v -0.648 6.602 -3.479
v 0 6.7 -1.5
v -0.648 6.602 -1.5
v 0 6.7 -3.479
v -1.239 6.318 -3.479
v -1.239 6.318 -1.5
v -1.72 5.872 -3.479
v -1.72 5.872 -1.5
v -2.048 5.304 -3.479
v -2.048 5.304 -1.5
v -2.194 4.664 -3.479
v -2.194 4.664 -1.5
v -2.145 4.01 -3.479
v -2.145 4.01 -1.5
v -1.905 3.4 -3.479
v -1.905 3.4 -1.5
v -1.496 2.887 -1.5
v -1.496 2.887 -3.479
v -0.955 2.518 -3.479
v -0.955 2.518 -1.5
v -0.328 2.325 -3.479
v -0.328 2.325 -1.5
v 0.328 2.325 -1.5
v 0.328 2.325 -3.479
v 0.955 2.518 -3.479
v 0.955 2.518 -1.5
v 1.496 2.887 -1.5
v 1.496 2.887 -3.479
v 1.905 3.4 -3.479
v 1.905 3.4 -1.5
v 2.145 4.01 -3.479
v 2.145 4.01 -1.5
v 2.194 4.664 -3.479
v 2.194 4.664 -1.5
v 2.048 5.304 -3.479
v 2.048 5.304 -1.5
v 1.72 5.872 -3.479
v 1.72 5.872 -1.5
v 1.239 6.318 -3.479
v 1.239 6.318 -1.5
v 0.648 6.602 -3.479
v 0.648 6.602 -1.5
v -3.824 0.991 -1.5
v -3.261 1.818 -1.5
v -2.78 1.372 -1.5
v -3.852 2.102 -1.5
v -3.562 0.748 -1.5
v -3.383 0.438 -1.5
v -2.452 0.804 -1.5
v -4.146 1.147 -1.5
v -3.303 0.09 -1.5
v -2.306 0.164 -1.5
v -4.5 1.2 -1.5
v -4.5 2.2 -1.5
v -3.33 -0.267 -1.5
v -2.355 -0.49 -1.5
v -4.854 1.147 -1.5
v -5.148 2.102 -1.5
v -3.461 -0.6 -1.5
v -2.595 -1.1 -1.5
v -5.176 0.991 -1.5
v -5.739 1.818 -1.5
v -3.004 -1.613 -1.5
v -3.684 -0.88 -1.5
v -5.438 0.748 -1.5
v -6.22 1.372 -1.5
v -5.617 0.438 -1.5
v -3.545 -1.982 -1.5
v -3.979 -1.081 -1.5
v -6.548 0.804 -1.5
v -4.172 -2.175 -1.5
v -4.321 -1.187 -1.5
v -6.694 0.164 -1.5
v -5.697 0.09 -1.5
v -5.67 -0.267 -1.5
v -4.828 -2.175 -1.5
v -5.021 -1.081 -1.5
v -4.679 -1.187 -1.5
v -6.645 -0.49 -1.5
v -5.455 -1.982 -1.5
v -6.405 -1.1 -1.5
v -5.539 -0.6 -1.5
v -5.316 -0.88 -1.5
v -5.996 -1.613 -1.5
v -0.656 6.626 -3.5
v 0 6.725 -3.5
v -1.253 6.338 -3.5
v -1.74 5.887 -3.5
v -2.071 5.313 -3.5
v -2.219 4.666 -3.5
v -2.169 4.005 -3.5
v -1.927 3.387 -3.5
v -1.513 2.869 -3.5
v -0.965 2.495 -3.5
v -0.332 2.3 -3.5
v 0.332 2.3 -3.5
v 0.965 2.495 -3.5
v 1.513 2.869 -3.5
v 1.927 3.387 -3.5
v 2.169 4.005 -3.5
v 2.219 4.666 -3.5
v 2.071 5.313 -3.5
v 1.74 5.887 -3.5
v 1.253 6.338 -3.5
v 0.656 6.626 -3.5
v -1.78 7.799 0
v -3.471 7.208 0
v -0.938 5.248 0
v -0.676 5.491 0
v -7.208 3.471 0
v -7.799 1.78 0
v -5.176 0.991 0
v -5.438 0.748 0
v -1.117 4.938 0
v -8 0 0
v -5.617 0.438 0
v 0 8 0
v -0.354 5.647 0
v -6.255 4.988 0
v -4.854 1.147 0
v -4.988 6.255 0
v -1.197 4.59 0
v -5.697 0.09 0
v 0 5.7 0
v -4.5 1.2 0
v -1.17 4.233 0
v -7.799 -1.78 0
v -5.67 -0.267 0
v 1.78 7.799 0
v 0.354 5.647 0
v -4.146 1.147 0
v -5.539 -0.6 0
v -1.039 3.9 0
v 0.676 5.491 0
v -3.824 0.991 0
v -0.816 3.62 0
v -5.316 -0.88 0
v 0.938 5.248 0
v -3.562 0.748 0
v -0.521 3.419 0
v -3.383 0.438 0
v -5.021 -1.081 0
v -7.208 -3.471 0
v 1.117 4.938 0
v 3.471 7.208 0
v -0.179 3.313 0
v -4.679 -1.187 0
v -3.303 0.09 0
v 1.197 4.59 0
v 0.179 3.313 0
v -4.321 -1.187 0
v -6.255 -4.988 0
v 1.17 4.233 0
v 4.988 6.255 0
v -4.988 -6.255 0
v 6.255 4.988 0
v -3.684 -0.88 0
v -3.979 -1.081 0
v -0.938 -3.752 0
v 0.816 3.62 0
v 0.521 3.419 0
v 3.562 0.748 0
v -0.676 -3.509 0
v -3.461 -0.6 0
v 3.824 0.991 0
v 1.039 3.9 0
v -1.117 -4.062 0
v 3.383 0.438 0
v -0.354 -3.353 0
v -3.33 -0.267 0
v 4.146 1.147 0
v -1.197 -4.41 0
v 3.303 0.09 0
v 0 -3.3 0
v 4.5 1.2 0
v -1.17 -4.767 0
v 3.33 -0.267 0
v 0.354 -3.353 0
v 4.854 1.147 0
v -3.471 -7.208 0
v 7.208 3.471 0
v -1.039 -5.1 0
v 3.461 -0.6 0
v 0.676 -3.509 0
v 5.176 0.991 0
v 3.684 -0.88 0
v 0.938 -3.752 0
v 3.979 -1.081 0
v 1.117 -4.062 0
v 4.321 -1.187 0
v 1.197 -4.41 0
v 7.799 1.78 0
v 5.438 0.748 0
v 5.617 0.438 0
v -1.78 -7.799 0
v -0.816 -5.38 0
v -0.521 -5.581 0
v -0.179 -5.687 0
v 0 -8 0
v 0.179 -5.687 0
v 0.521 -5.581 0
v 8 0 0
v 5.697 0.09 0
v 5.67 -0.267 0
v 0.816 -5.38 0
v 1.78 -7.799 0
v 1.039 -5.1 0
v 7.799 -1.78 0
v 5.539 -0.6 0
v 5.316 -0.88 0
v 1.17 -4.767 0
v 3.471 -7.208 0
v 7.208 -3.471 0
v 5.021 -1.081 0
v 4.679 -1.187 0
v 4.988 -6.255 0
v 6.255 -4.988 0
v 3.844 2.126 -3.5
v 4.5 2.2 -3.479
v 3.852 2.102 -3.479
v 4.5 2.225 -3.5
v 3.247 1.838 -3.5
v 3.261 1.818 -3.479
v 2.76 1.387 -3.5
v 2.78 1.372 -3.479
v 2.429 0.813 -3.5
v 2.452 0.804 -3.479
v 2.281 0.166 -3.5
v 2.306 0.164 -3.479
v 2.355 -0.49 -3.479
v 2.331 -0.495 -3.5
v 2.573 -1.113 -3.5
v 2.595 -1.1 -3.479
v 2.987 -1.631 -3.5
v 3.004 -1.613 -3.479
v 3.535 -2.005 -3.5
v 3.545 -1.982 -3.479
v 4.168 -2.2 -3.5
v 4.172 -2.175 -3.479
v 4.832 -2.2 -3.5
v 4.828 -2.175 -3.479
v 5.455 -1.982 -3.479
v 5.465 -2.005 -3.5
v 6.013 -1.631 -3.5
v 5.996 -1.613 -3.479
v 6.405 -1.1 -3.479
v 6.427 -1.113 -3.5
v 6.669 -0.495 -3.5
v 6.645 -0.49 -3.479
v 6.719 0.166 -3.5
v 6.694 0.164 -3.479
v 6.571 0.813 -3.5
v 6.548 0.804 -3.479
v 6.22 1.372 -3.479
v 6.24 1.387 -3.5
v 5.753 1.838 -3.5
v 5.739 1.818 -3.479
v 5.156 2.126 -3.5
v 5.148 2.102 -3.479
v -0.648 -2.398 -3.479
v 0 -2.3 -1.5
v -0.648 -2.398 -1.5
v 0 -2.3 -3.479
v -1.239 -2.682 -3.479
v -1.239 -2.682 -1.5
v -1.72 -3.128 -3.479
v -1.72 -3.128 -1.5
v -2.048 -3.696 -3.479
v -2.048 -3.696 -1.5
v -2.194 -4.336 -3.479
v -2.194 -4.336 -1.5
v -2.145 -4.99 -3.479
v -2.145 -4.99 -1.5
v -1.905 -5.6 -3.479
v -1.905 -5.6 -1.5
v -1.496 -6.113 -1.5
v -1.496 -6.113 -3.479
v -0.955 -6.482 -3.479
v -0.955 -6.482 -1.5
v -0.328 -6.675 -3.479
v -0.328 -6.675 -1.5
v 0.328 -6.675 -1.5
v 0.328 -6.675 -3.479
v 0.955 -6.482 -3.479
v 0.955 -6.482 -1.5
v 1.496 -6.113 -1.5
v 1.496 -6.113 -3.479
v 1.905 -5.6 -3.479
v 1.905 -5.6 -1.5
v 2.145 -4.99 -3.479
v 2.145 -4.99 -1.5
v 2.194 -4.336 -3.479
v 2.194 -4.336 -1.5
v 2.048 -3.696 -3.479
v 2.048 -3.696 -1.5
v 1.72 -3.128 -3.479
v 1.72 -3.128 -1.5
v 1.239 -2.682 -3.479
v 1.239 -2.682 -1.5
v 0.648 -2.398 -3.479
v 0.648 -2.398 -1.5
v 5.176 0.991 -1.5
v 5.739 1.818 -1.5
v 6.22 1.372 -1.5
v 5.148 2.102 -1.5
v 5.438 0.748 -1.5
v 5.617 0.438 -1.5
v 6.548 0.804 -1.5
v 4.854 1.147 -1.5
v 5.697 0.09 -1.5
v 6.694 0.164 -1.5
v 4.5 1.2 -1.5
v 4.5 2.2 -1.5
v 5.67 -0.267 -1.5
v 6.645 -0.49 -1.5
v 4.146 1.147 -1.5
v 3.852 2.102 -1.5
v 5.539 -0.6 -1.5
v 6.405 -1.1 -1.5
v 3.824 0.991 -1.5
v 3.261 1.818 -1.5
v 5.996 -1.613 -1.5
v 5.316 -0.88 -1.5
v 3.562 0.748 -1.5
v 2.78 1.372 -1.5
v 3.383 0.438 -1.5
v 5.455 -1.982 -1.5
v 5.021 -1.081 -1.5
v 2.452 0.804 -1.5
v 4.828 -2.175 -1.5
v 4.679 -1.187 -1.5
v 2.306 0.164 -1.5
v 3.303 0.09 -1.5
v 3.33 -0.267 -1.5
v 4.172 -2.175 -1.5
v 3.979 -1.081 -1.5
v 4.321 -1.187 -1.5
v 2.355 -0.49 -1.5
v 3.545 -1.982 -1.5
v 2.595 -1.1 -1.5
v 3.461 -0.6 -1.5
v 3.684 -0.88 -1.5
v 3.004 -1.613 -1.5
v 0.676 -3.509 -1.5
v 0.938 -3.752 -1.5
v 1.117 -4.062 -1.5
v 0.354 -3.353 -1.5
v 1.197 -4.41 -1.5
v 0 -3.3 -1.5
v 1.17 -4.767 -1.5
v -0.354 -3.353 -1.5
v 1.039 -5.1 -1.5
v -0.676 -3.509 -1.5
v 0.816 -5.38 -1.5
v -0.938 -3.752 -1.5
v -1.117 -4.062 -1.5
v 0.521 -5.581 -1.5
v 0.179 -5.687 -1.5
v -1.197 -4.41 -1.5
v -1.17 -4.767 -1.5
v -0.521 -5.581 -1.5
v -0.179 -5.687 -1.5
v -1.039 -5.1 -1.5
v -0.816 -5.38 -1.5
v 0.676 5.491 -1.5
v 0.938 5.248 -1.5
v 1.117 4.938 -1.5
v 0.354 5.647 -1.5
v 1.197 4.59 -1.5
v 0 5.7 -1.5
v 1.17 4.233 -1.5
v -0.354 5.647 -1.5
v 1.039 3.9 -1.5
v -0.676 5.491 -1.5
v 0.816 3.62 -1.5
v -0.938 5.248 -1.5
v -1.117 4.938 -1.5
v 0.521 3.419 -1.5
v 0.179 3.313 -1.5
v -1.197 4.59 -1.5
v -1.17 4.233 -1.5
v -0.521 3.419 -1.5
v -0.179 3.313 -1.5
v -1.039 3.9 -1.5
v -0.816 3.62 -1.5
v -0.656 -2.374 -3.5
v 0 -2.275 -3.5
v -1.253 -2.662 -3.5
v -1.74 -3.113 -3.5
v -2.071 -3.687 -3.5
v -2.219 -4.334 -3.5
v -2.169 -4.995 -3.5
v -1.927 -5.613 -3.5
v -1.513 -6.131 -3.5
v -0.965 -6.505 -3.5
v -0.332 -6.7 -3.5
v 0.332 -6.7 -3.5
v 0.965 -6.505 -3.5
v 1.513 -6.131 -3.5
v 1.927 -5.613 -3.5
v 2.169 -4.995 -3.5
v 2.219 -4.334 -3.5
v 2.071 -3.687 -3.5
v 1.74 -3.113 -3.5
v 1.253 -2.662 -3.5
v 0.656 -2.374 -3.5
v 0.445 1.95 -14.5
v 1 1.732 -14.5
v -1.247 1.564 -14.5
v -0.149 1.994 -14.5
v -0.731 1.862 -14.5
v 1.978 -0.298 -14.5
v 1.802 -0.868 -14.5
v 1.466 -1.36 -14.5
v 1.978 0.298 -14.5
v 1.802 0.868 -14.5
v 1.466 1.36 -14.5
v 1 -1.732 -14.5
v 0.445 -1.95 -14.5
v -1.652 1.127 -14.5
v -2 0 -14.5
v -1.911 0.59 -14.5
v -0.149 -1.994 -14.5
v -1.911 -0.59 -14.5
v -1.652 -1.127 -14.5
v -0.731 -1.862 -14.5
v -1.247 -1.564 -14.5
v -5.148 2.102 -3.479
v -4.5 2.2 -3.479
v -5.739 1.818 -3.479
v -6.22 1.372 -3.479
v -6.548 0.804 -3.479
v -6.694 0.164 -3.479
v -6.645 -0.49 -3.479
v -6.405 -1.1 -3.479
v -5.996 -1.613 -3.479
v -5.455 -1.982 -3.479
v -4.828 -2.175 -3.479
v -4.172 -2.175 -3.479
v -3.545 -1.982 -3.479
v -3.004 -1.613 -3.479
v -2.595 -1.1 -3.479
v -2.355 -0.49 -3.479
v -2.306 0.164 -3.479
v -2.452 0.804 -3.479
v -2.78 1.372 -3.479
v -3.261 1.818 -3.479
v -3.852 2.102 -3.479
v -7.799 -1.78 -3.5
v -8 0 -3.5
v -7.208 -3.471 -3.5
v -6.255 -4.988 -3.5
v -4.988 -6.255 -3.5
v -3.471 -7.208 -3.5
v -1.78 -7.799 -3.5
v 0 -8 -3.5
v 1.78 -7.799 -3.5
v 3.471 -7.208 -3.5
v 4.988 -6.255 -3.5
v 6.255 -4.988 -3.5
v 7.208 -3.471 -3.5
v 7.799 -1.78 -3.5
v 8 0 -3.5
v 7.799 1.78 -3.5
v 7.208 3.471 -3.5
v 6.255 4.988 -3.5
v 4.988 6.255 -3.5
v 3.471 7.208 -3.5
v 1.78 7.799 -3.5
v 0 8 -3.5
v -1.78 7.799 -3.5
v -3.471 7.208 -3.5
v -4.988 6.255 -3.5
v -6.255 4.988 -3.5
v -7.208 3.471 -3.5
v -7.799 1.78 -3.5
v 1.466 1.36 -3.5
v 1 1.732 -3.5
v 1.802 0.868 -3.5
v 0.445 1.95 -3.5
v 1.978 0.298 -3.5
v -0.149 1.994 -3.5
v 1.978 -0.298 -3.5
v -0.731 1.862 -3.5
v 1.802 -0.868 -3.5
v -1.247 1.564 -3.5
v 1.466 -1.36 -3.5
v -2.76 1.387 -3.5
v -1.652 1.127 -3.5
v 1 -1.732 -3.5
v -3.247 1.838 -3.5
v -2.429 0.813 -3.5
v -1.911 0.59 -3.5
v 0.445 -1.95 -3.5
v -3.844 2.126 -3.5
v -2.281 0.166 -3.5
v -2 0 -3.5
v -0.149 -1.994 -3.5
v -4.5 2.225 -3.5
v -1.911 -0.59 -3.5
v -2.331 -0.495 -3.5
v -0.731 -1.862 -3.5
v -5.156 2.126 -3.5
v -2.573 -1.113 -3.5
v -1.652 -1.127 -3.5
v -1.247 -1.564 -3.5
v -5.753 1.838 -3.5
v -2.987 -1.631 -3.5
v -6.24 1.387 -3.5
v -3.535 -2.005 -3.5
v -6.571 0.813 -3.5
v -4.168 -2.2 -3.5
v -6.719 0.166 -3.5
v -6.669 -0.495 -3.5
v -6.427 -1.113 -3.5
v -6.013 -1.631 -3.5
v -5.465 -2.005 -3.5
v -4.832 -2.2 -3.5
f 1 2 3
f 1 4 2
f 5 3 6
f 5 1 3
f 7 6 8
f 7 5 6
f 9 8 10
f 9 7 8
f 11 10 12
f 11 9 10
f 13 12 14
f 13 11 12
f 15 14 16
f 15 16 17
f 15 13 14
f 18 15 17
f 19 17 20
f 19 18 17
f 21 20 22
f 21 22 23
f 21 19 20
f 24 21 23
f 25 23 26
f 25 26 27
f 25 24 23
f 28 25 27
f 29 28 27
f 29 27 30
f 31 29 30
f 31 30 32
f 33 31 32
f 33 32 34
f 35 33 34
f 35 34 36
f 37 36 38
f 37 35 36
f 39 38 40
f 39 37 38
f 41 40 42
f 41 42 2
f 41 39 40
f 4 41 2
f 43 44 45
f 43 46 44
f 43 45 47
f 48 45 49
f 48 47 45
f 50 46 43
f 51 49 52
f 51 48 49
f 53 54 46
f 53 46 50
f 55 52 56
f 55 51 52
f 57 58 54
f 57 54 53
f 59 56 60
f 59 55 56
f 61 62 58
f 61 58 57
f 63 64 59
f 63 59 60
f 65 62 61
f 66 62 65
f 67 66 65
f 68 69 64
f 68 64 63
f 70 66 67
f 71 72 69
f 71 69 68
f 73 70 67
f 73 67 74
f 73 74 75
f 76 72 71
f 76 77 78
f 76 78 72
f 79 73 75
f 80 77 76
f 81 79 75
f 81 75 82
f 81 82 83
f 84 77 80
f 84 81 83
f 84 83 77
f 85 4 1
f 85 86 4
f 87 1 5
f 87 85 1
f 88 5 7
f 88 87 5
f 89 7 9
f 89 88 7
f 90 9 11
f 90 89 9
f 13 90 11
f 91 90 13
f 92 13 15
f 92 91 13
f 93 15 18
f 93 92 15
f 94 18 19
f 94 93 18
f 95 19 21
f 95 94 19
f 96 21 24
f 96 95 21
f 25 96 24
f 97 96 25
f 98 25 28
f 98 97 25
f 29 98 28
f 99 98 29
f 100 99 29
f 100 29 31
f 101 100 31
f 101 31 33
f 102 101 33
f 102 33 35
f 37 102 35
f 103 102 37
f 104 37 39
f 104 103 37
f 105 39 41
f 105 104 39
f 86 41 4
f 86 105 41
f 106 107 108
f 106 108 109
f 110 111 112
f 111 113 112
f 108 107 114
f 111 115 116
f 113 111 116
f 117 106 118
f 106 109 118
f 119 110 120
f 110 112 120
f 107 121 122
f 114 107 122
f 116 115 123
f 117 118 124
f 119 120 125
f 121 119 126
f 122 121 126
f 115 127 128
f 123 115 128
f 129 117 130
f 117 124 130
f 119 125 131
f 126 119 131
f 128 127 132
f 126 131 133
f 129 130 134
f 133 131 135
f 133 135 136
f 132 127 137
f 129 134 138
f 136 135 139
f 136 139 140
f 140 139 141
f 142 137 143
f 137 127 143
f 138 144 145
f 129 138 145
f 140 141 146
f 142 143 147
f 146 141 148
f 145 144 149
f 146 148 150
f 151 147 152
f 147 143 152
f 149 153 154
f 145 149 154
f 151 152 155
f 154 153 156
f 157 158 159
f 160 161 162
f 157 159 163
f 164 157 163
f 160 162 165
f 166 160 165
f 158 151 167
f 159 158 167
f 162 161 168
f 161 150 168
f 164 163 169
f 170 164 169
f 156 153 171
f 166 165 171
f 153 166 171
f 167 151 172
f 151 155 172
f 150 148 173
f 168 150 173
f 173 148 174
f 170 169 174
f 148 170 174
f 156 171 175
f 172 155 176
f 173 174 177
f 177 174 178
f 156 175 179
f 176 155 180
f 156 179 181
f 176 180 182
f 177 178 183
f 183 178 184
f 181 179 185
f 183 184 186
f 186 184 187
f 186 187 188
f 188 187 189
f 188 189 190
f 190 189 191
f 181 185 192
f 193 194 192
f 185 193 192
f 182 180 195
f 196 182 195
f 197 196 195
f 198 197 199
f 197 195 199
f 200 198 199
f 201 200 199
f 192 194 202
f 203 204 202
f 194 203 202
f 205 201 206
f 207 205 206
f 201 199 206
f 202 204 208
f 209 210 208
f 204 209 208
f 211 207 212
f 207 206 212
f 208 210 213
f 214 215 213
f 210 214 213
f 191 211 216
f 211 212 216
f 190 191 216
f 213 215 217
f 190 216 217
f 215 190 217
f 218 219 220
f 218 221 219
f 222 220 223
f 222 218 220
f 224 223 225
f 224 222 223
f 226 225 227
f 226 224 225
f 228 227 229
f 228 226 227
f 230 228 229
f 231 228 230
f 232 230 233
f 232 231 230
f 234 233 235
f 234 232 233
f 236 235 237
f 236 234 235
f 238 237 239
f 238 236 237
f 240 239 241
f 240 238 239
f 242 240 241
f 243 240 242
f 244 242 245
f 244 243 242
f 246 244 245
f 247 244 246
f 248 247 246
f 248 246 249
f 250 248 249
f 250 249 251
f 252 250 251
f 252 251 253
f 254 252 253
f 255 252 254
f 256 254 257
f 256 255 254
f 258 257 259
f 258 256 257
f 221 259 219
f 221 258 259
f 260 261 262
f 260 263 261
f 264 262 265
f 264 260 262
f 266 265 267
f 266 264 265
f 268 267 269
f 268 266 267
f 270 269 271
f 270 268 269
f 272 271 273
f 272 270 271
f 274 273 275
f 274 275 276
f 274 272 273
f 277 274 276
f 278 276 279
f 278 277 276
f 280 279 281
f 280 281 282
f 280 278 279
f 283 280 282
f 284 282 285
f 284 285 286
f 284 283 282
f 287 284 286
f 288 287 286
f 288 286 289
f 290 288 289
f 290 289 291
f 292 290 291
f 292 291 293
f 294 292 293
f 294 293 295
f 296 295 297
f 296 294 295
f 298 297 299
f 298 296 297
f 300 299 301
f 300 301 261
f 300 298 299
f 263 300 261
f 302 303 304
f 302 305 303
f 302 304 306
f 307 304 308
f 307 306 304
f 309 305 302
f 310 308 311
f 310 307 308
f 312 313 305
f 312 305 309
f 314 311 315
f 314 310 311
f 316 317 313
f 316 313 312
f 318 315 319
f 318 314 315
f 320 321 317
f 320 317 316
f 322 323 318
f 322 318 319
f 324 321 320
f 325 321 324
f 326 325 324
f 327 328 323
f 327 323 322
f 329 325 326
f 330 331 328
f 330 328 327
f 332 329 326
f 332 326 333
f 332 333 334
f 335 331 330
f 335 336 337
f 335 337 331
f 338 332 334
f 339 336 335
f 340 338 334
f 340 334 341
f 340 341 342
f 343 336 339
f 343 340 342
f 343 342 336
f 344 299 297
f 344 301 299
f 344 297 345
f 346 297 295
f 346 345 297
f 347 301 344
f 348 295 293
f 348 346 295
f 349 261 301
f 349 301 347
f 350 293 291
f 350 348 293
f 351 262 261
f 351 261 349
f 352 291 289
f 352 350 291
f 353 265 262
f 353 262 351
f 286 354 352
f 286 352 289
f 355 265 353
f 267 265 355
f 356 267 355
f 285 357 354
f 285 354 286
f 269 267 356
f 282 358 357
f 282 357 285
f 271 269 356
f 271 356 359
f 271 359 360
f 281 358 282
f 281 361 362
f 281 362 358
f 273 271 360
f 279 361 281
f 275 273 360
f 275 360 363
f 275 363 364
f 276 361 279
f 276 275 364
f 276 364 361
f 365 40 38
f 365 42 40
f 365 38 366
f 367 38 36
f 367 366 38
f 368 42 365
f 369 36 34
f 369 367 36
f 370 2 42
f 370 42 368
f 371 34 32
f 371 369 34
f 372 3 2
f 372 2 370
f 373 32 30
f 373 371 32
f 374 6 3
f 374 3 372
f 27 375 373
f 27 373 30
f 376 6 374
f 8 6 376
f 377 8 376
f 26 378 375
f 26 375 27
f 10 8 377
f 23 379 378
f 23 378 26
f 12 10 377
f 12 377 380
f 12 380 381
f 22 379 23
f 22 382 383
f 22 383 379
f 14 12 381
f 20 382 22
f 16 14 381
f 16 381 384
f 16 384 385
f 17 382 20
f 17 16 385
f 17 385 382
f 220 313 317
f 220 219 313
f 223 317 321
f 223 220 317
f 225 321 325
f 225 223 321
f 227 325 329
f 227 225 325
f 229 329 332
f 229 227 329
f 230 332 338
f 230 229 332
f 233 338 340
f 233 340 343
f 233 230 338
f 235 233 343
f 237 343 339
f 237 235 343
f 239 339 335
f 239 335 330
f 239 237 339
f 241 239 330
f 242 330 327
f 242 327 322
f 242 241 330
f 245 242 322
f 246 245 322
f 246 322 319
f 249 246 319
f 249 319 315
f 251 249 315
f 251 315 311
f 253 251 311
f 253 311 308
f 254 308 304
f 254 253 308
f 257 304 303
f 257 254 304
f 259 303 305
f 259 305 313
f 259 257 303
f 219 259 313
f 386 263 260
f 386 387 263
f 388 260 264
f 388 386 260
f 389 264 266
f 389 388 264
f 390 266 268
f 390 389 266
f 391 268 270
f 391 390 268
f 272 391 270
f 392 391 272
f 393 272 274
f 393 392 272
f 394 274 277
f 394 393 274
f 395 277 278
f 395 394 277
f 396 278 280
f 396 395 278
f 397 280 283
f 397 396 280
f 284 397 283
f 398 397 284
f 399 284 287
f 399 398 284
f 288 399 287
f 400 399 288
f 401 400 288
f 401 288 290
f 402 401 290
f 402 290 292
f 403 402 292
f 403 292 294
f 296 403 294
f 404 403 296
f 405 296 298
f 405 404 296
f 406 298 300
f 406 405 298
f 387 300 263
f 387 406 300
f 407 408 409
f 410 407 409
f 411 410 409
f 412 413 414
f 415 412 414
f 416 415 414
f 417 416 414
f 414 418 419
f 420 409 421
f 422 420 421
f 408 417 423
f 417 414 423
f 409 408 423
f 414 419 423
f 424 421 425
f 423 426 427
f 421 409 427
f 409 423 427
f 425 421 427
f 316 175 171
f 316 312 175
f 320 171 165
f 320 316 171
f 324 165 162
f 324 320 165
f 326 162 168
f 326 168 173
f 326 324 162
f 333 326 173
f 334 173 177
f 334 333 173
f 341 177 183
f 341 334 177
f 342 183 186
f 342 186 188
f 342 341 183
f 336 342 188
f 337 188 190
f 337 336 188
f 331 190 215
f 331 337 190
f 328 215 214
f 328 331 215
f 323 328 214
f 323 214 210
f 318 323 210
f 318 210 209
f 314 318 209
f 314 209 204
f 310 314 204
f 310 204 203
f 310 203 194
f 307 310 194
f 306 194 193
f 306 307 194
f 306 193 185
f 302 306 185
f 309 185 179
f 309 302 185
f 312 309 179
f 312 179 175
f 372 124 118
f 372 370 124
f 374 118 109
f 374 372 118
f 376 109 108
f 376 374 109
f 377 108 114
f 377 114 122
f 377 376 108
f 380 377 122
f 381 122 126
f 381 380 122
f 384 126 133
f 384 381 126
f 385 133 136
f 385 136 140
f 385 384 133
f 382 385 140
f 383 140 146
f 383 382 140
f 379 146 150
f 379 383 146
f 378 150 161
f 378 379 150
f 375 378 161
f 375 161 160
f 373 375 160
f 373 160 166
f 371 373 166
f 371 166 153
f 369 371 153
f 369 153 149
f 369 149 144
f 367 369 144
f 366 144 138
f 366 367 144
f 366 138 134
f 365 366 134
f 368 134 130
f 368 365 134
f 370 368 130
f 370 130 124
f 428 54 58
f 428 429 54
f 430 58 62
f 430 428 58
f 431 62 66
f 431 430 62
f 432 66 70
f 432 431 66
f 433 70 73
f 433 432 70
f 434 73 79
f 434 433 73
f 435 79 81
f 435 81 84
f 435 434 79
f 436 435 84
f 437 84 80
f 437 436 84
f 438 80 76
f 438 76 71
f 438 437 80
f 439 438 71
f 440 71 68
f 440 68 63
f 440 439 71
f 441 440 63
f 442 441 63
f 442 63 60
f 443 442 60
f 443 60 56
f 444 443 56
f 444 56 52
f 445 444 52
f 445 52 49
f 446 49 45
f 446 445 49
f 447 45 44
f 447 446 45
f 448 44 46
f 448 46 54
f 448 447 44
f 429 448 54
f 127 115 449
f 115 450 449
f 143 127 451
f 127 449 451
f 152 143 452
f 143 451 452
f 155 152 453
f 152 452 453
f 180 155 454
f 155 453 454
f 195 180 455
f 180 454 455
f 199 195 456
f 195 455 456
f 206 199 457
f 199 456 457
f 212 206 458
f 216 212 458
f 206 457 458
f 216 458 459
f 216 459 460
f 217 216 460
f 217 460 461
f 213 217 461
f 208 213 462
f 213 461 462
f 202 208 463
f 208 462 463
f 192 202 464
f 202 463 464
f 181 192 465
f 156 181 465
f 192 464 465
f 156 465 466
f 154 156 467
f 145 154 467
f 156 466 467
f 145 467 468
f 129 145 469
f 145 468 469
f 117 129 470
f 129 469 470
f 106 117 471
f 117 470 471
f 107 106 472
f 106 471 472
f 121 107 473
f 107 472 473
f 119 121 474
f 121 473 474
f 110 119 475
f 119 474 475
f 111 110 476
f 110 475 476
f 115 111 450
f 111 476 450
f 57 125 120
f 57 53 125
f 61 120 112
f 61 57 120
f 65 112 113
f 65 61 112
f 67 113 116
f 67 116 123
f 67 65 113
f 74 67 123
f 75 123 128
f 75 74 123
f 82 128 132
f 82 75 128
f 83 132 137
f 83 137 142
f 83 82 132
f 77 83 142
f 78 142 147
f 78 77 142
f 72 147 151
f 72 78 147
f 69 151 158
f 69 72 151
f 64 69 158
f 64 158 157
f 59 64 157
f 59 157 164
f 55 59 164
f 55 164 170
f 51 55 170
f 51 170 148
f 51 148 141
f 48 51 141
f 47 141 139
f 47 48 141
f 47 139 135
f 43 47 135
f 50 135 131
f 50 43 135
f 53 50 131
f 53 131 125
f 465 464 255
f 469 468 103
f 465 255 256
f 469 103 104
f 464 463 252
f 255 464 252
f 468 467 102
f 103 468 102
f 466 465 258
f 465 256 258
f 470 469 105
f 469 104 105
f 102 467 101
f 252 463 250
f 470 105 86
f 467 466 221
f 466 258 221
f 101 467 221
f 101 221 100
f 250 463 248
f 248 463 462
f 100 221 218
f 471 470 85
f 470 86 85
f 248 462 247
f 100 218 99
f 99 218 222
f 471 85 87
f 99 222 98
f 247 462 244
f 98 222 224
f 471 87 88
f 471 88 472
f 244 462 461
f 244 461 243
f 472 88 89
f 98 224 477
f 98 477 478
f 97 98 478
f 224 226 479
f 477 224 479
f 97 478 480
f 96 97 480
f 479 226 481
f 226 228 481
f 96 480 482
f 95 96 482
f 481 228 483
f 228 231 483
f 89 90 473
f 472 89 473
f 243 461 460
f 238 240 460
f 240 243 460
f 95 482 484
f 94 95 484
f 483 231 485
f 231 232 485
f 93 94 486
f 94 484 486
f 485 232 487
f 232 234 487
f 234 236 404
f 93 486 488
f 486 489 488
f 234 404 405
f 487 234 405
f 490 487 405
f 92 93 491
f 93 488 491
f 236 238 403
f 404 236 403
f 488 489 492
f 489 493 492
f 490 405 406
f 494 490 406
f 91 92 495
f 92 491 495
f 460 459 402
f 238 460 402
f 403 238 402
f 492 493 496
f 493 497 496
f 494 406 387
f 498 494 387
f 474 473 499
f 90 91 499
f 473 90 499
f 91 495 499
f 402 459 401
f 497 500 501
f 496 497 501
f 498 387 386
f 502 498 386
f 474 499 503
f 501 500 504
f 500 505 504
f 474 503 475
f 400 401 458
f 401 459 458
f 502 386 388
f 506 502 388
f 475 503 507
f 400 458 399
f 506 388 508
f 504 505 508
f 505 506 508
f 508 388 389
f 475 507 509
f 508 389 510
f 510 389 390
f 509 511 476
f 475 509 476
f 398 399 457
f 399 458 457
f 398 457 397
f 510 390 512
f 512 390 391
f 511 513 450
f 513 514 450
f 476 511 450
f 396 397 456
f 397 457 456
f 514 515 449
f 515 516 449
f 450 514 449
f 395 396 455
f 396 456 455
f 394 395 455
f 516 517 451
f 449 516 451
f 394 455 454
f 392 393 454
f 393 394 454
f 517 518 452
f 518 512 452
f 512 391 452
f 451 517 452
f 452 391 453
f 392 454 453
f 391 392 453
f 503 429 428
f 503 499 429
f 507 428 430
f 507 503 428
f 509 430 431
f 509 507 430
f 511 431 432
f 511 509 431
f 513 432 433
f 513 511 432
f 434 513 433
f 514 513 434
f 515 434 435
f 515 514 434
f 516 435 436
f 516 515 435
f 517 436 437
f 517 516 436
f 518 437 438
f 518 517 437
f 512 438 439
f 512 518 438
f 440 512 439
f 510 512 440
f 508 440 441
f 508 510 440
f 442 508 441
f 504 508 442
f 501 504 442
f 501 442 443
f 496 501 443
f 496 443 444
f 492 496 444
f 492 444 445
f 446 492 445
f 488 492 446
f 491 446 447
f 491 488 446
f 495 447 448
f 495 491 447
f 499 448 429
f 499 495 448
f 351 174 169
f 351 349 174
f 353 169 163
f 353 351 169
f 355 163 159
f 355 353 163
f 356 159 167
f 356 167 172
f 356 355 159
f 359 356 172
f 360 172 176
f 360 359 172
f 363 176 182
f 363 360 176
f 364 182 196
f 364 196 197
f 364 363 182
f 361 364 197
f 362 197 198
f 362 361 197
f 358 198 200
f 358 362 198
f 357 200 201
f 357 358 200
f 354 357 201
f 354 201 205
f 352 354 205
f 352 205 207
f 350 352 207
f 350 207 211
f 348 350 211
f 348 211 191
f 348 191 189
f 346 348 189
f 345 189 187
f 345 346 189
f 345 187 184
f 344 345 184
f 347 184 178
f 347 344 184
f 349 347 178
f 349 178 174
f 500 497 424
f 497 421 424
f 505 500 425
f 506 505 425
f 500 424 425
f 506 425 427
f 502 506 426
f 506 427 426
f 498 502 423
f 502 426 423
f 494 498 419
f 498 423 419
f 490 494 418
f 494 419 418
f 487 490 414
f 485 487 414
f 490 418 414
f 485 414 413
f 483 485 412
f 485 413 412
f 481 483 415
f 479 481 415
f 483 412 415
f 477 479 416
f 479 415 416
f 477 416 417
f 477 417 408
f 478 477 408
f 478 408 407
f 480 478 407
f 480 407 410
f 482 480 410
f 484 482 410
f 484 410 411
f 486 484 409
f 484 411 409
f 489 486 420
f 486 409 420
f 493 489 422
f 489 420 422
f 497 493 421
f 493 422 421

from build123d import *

# Parameters (mm, degrees)
CBORE_FOR_M2_SHCS1_AT_2_COUNT = 2
CBORE_FOR_M2_SHCS1_AT_2_PITCH = 6.363961031
CBORE_FOR_M2_SHCS1_AT_3_COUNT = 2
CBORE_FOR_M2_SHCS1_AT_3_PITCH = 9
CBORE_FOR_M2_SHCS1_AT_4_COUNT = 2
CBORE_FOR_M2_SHCS1_AT_4_PITCH = 6.363961031


with BuildPart() as part:
    # Sketch2 → Revolve1 (revolve)
    with BuildSketch(Plane(origin=(0, 0, 0), x_dir=(1, 0, 0), z_dir=(0, 1, 0)), mode=Mode.PRIVATE) as revolve1_sk:
        Polygon((0, 0), (8, 0), (8, 3.5), (2, 3.5), (2, 14.5), (0, 14.5), align=None)
    revolve(revolve1_sk.sketch.rotate(Axis((0, 0, -14.5), (0, 0, 1)), 180), axis=Axis((0, 0, -14.5), (0, 0, 1)))

    # Sketch5 → CBORE for M2 SHCS1 (revolve, cut)
    with BuildSketch(Plane(origin=(0, 4.5, -3.5), x_dir=(0, 1, 0), z_dir=(1, 0, 0))):
        Polygon((0, 0), (0, 3.5), (1.2, 3.5), (1.2, 2), (2.2, 2), (2.2, 0.020977491), (2.225, 0), align=None)
    cbore_for_m2_shcs1 = revolve(axis=Axis((0, 4.5, -9.85), (0, 0, 1)), mode=Mode.SUBTRACT)

    # CBORE for M2 SHCS1 at 2: CBORE for M2 SHCS1 ×2
    with Locations(*[Vector(-0.7071067811865476, -0.7071067811865476, 0) * (i * CBORE_FOR_M2_SHCS1_AT_2_PITCH) for i in range(1, CBORE_FOR_M2_SHCS1_AT_2_COUNT)]):
        add(cbore_for_m2_shcs1, mode=Mode.SUBTRACT)

    # CBORE for M2 SHCS1 at 3: CBORE for M2 SHCS1 ×2
    with Locations(*[(0, -i * CBORE_FOR_M2_SHCS1_AT_3_PITCH, 0) for i in range(1, CBORE_FOR_M2_SHCS1_AT_3_COUNT)]):
        add(cbore_for_m2_shcs1, mode=Mode.SUBTRACT)

    # CBORE for M2 SHCS1 at 4: CBORE for M2 SHCS1 ×2
    with Locations(*[Vector(0.7071067811865476, -0.7071067811865476, 0) * (i * CBORE_FOR_M2_SHCS1_AT_4_PITCH) for i in range(1, CBORE_FOR_M2_SHCS1_AT_4_COUNT)]):
        add(cbore_for_m2_shcs1, mode=Mode.SUBTRACT)


solid = part.part
